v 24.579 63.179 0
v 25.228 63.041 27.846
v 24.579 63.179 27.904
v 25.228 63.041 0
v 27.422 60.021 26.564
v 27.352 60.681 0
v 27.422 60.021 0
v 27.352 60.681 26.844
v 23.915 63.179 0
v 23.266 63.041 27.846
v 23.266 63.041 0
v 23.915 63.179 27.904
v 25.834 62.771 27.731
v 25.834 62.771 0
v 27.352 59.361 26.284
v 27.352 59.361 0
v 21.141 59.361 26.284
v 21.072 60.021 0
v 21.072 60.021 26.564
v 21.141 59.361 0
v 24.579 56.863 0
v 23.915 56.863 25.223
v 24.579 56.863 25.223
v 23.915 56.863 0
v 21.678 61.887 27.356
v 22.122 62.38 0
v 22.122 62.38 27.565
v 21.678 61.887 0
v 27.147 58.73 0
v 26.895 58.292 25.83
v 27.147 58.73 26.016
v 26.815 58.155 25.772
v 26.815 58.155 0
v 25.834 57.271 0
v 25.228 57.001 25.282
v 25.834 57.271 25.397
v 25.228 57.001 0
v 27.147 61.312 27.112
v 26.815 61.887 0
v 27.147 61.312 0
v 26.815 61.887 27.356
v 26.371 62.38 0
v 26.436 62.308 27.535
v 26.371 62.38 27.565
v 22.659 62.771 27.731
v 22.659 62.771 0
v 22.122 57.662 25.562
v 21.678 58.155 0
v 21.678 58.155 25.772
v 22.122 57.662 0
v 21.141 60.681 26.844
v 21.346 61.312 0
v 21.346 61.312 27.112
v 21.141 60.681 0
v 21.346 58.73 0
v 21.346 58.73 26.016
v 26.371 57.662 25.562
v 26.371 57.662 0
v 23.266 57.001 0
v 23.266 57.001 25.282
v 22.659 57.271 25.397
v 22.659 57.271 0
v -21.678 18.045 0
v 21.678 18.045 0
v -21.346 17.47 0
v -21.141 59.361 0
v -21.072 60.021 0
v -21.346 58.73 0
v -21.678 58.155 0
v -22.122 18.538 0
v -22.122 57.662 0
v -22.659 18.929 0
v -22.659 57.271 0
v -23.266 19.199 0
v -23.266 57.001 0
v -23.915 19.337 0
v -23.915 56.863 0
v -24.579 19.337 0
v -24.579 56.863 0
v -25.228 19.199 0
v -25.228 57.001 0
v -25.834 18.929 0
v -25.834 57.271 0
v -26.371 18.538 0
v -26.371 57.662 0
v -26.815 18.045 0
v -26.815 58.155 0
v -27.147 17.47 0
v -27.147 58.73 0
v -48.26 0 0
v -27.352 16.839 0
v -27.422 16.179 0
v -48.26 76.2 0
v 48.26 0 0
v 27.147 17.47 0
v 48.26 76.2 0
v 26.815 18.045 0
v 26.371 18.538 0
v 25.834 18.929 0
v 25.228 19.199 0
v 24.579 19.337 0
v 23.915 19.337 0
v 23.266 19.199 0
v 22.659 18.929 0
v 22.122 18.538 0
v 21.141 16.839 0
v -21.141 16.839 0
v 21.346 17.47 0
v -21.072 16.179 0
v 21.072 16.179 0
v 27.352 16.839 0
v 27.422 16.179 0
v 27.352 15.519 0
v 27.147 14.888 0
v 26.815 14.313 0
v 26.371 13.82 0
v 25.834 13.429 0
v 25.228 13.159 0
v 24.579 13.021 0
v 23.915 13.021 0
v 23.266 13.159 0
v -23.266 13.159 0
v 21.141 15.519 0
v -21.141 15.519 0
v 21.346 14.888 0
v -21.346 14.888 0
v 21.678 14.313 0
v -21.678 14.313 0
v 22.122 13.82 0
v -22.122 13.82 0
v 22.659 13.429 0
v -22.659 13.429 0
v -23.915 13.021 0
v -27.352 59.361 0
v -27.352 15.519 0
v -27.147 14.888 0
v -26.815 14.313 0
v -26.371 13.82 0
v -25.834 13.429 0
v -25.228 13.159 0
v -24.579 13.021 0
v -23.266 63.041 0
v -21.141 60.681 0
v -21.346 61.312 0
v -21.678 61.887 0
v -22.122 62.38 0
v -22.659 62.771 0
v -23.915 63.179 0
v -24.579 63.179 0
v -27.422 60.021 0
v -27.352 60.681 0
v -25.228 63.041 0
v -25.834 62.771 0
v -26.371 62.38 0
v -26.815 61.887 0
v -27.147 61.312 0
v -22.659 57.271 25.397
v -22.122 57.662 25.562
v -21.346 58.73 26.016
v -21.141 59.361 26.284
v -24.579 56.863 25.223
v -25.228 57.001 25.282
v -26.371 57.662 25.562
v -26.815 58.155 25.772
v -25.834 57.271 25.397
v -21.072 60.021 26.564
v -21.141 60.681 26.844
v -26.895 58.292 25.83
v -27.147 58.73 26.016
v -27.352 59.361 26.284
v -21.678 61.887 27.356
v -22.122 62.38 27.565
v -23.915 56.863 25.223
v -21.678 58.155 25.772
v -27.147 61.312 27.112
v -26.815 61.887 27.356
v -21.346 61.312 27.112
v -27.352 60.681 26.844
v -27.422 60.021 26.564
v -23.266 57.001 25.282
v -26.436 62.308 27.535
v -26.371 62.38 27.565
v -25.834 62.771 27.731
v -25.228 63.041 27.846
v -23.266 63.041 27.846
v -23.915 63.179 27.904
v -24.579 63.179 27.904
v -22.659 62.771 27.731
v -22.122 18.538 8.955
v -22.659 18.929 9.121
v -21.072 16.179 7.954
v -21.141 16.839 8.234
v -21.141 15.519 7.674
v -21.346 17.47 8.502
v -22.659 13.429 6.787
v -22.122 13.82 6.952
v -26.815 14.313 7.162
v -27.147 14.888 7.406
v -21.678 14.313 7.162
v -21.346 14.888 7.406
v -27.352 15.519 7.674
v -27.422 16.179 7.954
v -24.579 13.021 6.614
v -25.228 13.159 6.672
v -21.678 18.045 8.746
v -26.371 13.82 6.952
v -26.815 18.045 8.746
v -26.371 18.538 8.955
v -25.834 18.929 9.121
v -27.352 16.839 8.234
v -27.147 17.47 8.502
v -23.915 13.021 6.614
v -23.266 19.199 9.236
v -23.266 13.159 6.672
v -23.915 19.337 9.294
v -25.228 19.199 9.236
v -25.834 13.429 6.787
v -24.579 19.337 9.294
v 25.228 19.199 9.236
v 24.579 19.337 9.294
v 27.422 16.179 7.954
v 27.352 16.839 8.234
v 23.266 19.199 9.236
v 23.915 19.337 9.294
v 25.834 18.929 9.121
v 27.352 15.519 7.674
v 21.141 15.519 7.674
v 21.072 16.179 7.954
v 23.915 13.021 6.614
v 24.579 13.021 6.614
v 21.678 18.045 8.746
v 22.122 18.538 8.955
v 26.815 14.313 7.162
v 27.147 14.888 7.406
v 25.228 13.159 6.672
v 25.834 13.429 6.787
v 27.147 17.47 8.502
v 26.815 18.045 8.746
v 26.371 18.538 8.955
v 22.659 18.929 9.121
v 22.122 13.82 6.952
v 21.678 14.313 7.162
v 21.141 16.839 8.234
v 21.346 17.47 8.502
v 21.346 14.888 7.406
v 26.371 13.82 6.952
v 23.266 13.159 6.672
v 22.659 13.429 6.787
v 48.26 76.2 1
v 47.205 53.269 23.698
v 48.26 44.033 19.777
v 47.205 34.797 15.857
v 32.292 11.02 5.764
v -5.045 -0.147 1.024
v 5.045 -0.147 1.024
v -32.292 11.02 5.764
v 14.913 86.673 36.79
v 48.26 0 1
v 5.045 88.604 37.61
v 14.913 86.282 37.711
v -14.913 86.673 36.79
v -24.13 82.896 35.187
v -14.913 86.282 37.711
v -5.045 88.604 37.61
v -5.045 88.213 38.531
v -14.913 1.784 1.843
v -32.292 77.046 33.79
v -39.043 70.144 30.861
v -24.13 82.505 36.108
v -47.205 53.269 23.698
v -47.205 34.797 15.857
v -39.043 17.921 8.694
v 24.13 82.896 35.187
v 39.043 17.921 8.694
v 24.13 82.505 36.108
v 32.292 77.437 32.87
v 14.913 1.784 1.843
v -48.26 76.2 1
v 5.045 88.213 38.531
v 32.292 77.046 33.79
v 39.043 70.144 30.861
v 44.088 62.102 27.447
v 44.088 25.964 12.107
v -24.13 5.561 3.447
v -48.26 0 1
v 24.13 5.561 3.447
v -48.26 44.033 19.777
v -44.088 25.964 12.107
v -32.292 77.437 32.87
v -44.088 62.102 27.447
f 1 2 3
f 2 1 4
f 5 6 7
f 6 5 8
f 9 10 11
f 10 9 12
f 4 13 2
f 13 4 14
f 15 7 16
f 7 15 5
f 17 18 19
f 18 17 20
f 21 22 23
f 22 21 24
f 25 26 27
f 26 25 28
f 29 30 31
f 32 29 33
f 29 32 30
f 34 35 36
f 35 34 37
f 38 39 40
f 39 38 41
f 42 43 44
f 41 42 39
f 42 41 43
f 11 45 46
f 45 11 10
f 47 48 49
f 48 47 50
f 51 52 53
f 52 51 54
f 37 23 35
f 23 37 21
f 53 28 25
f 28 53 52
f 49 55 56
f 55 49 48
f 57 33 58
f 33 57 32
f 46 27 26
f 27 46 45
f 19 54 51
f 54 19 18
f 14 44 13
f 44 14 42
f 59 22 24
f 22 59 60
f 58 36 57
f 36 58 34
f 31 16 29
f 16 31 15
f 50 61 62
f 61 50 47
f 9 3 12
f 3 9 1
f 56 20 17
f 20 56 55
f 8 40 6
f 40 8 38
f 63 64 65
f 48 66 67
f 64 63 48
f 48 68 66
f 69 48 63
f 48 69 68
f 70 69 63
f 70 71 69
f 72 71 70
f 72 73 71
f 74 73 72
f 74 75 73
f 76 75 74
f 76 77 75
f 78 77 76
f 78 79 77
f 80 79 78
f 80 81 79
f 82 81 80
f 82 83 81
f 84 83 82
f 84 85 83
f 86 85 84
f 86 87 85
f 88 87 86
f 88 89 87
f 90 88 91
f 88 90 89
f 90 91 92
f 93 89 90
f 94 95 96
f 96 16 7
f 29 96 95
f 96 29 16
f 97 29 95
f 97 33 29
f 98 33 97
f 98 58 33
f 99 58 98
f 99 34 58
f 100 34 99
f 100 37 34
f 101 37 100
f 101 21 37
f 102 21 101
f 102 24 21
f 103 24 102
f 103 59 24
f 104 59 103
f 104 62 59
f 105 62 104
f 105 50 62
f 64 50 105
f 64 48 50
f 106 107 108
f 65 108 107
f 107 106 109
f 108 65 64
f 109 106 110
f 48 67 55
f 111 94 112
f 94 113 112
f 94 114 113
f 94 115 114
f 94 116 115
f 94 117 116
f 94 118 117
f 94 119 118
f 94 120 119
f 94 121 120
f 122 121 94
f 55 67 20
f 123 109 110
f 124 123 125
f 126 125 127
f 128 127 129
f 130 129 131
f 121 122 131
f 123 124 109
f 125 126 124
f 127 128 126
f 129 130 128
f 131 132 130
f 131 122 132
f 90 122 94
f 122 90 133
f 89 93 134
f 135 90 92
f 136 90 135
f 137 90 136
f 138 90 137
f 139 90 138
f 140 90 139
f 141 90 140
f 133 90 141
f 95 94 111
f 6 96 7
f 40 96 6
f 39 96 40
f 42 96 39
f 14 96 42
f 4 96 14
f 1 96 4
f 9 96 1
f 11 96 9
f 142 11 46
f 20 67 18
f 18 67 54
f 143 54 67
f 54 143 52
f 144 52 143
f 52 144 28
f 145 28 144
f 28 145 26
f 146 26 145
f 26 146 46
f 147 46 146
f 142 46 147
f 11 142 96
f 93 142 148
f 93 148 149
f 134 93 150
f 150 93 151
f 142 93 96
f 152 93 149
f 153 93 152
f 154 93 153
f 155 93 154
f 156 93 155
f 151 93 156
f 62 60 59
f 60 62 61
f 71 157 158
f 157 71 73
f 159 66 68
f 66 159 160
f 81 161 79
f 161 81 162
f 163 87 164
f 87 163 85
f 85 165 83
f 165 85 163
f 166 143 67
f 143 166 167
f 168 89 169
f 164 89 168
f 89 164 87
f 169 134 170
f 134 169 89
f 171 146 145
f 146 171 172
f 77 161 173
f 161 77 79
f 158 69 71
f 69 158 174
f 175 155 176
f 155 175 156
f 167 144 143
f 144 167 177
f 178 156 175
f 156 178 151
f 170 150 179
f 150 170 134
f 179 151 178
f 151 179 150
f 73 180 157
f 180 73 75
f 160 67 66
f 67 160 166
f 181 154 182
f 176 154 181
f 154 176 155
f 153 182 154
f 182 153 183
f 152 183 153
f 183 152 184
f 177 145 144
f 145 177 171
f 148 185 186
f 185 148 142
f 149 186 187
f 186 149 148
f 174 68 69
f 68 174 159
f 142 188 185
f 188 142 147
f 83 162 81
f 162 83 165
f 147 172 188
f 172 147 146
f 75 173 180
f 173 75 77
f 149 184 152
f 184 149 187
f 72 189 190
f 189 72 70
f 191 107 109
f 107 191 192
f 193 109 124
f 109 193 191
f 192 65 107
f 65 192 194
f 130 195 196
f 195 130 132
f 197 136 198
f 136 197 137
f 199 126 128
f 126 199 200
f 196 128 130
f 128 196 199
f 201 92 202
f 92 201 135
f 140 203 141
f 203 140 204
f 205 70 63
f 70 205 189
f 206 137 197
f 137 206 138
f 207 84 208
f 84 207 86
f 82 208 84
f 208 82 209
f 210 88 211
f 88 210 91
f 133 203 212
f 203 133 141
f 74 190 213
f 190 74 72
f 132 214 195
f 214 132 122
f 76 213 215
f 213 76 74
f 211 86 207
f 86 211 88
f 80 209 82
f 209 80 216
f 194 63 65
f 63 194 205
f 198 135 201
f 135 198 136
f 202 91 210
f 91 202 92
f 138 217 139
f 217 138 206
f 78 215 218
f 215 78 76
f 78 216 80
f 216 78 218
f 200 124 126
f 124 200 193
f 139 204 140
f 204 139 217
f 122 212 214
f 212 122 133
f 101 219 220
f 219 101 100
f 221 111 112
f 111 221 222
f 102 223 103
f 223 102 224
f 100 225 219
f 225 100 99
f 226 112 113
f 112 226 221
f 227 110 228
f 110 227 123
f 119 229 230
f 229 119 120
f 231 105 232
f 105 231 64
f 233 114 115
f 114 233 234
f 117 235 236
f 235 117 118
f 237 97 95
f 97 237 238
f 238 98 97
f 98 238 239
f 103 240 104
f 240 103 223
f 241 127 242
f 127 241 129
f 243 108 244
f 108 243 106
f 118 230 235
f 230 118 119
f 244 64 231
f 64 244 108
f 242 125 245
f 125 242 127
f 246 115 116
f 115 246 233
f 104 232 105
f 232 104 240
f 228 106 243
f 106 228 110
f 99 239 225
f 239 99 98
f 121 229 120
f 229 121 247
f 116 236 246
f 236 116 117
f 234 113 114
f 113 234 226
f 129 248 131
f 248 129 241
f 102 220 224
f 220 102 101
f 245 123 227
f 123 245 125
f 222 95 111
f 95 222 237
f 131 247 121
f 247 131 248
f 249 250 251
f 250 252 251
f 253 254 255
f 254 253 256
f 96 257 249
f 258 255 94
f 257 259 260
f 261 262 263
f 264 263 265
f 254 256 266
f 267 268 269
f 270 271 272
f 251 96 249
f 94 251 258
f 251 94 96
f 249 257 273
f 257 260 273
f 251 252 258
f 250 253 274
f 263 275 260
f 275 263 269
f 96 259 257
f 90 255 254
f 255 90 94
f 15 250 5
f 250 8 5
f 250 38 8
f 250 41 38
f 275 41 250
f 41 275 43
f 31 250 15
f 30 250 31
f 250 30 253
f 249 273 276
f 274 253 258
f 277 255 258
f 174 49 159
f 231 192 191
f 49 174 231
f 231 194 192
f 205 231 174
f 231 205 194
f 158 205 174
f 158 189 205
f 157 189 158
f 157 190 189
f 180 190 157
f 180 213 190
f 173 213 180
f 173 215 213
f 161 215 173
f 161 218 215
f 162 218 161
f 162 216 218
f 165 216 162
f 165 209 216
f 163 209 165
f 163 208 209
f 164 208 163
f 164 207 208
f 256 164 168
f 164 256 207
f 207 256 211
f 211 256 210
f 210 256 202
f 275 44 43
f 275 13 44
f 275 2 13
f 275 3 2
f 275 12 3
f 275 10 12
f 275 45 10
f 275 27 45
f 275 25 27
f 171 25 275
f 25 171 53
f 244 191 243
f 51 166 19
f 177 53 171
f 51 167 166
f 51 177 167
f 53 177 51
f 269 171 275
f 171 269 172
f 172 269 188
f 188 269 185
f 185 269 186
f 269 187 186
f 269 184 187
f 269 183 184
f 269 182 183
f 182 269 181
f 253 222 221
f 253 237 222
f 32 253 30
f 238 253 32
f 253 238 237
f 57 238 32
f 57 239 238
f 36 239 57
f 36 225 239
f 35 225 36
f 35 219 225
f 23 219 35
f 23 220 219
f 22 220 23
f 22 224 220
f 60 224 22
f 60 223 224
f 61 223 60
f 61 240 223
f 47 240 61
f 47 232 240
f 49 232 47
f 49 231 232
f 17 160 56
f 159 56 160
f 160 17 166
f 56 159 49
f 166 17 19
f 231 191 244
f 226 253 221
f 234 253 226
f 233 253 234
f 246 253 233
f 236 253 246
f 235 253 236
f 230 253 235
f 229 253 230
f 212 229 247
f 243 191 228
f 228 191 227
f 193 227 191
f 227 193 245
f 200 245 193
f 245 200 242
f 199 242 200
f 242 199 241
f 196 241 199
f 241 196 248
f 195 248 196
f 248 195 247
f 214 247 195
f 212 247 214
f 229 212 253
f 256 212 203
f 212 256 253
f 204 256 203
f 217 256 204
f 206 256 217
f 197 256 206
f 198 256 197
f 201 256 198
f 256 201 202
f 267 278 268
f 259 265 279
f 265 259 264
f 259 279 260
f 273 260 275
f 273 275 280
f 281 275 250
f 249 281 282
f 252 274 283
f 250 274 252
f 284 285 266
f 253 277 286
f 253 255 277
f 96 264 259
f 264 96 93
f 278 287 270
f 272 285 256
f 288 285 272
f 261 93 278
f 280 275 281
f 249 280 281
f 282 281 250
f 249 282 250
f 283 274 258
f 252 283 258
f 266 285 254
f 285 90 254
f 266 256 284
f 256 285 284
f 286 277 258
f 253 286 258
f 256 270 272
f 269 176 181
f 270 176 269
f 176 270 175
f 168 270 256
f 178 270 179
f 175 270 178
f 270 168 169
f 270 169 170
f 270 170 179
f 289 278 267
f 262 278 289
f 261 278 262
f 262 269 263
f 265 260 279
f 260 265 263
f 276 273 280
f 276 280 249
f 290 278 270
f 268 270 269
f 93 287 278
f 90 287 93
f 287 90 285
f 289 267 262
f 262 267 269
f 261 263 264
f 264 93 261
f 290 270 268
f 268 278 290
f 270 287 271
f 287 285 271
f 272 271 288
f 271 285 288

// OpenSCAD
in=25.4;

flanged = 3.8*in; //diameter of the whole flange
holed = 2.7*in; //diameter of the circle of bolt holes
boltd = in*1/4;   //bolt hole size
angle = 23;     //tilt angle
barw = 3*in; //width of the base plate

h=holed*sin(angle);

module bolt_holes(d, boltd, h, start=45, tilt=0) {
    variance=10/100;
        for (a=[start:90:359+start]) {
            hull() {
                x=cos(a)*d/2;
                y=cos(tilt*(1-variance))*sin(a)*d/2;
                echo(x=x, y=y);
                translate([x, y, 0]) cylinder(d=boltd, h=h);
                y=cos(tilt*(1+variance))*sin(a)*d/2;
                translate([x, y, 0]) cylinder(d=boltd, h=h);
            }
        }
}

module main_body_square_base(d, a, base) {
        hull() {
           # rotate([a,0,0]) translate([0, d/2,0]) cylinder(d=d, h=1);
            translate([-d/2,0, 0]) cube([base[0], min(d, base[1]), 1]);
        }
}

module main_body_round_base(d, a) {
    hull() {
        rotate([a,0,0]) translate([0, d/2,0]) cylinder(d=d, h=1);
        translate([0, d/2, 0]) cylinder(d=d, h=1);
    }
}

module flange_shim(barw=3*in, flanged=4*in, angle=23) {    
   h=max(flanged,barw)*cos(90-angle);   //match the highest point at the angle given
   $fn=30;
    difference() {
        //color("green") main_body_round_base(flanged, angle);
        color("green") main_body_square_base(flanged, angle, [flanged, barw]);
        #translate([0, min(flanged, barw)/2, 0]) bolt_holes(holed, boltd, h, 45, angle);
        }
}


module bolt_shim(d=1*in, boltd=1+in*1/4, angle=23) {    
    h=d*cos(90-angle);  //match the higheste point at the angle given
    $fn=30;
    difference() {
        main_body_round_base(d, angle);
        #translate([0, d/2, 0]) cylinder(d=boltd, h=h);
    }
}

flange_shim(barw, flanged, angle);
//translate([flanged, 0, 0]) bolt_shim(.75*in, boltd, angle);
